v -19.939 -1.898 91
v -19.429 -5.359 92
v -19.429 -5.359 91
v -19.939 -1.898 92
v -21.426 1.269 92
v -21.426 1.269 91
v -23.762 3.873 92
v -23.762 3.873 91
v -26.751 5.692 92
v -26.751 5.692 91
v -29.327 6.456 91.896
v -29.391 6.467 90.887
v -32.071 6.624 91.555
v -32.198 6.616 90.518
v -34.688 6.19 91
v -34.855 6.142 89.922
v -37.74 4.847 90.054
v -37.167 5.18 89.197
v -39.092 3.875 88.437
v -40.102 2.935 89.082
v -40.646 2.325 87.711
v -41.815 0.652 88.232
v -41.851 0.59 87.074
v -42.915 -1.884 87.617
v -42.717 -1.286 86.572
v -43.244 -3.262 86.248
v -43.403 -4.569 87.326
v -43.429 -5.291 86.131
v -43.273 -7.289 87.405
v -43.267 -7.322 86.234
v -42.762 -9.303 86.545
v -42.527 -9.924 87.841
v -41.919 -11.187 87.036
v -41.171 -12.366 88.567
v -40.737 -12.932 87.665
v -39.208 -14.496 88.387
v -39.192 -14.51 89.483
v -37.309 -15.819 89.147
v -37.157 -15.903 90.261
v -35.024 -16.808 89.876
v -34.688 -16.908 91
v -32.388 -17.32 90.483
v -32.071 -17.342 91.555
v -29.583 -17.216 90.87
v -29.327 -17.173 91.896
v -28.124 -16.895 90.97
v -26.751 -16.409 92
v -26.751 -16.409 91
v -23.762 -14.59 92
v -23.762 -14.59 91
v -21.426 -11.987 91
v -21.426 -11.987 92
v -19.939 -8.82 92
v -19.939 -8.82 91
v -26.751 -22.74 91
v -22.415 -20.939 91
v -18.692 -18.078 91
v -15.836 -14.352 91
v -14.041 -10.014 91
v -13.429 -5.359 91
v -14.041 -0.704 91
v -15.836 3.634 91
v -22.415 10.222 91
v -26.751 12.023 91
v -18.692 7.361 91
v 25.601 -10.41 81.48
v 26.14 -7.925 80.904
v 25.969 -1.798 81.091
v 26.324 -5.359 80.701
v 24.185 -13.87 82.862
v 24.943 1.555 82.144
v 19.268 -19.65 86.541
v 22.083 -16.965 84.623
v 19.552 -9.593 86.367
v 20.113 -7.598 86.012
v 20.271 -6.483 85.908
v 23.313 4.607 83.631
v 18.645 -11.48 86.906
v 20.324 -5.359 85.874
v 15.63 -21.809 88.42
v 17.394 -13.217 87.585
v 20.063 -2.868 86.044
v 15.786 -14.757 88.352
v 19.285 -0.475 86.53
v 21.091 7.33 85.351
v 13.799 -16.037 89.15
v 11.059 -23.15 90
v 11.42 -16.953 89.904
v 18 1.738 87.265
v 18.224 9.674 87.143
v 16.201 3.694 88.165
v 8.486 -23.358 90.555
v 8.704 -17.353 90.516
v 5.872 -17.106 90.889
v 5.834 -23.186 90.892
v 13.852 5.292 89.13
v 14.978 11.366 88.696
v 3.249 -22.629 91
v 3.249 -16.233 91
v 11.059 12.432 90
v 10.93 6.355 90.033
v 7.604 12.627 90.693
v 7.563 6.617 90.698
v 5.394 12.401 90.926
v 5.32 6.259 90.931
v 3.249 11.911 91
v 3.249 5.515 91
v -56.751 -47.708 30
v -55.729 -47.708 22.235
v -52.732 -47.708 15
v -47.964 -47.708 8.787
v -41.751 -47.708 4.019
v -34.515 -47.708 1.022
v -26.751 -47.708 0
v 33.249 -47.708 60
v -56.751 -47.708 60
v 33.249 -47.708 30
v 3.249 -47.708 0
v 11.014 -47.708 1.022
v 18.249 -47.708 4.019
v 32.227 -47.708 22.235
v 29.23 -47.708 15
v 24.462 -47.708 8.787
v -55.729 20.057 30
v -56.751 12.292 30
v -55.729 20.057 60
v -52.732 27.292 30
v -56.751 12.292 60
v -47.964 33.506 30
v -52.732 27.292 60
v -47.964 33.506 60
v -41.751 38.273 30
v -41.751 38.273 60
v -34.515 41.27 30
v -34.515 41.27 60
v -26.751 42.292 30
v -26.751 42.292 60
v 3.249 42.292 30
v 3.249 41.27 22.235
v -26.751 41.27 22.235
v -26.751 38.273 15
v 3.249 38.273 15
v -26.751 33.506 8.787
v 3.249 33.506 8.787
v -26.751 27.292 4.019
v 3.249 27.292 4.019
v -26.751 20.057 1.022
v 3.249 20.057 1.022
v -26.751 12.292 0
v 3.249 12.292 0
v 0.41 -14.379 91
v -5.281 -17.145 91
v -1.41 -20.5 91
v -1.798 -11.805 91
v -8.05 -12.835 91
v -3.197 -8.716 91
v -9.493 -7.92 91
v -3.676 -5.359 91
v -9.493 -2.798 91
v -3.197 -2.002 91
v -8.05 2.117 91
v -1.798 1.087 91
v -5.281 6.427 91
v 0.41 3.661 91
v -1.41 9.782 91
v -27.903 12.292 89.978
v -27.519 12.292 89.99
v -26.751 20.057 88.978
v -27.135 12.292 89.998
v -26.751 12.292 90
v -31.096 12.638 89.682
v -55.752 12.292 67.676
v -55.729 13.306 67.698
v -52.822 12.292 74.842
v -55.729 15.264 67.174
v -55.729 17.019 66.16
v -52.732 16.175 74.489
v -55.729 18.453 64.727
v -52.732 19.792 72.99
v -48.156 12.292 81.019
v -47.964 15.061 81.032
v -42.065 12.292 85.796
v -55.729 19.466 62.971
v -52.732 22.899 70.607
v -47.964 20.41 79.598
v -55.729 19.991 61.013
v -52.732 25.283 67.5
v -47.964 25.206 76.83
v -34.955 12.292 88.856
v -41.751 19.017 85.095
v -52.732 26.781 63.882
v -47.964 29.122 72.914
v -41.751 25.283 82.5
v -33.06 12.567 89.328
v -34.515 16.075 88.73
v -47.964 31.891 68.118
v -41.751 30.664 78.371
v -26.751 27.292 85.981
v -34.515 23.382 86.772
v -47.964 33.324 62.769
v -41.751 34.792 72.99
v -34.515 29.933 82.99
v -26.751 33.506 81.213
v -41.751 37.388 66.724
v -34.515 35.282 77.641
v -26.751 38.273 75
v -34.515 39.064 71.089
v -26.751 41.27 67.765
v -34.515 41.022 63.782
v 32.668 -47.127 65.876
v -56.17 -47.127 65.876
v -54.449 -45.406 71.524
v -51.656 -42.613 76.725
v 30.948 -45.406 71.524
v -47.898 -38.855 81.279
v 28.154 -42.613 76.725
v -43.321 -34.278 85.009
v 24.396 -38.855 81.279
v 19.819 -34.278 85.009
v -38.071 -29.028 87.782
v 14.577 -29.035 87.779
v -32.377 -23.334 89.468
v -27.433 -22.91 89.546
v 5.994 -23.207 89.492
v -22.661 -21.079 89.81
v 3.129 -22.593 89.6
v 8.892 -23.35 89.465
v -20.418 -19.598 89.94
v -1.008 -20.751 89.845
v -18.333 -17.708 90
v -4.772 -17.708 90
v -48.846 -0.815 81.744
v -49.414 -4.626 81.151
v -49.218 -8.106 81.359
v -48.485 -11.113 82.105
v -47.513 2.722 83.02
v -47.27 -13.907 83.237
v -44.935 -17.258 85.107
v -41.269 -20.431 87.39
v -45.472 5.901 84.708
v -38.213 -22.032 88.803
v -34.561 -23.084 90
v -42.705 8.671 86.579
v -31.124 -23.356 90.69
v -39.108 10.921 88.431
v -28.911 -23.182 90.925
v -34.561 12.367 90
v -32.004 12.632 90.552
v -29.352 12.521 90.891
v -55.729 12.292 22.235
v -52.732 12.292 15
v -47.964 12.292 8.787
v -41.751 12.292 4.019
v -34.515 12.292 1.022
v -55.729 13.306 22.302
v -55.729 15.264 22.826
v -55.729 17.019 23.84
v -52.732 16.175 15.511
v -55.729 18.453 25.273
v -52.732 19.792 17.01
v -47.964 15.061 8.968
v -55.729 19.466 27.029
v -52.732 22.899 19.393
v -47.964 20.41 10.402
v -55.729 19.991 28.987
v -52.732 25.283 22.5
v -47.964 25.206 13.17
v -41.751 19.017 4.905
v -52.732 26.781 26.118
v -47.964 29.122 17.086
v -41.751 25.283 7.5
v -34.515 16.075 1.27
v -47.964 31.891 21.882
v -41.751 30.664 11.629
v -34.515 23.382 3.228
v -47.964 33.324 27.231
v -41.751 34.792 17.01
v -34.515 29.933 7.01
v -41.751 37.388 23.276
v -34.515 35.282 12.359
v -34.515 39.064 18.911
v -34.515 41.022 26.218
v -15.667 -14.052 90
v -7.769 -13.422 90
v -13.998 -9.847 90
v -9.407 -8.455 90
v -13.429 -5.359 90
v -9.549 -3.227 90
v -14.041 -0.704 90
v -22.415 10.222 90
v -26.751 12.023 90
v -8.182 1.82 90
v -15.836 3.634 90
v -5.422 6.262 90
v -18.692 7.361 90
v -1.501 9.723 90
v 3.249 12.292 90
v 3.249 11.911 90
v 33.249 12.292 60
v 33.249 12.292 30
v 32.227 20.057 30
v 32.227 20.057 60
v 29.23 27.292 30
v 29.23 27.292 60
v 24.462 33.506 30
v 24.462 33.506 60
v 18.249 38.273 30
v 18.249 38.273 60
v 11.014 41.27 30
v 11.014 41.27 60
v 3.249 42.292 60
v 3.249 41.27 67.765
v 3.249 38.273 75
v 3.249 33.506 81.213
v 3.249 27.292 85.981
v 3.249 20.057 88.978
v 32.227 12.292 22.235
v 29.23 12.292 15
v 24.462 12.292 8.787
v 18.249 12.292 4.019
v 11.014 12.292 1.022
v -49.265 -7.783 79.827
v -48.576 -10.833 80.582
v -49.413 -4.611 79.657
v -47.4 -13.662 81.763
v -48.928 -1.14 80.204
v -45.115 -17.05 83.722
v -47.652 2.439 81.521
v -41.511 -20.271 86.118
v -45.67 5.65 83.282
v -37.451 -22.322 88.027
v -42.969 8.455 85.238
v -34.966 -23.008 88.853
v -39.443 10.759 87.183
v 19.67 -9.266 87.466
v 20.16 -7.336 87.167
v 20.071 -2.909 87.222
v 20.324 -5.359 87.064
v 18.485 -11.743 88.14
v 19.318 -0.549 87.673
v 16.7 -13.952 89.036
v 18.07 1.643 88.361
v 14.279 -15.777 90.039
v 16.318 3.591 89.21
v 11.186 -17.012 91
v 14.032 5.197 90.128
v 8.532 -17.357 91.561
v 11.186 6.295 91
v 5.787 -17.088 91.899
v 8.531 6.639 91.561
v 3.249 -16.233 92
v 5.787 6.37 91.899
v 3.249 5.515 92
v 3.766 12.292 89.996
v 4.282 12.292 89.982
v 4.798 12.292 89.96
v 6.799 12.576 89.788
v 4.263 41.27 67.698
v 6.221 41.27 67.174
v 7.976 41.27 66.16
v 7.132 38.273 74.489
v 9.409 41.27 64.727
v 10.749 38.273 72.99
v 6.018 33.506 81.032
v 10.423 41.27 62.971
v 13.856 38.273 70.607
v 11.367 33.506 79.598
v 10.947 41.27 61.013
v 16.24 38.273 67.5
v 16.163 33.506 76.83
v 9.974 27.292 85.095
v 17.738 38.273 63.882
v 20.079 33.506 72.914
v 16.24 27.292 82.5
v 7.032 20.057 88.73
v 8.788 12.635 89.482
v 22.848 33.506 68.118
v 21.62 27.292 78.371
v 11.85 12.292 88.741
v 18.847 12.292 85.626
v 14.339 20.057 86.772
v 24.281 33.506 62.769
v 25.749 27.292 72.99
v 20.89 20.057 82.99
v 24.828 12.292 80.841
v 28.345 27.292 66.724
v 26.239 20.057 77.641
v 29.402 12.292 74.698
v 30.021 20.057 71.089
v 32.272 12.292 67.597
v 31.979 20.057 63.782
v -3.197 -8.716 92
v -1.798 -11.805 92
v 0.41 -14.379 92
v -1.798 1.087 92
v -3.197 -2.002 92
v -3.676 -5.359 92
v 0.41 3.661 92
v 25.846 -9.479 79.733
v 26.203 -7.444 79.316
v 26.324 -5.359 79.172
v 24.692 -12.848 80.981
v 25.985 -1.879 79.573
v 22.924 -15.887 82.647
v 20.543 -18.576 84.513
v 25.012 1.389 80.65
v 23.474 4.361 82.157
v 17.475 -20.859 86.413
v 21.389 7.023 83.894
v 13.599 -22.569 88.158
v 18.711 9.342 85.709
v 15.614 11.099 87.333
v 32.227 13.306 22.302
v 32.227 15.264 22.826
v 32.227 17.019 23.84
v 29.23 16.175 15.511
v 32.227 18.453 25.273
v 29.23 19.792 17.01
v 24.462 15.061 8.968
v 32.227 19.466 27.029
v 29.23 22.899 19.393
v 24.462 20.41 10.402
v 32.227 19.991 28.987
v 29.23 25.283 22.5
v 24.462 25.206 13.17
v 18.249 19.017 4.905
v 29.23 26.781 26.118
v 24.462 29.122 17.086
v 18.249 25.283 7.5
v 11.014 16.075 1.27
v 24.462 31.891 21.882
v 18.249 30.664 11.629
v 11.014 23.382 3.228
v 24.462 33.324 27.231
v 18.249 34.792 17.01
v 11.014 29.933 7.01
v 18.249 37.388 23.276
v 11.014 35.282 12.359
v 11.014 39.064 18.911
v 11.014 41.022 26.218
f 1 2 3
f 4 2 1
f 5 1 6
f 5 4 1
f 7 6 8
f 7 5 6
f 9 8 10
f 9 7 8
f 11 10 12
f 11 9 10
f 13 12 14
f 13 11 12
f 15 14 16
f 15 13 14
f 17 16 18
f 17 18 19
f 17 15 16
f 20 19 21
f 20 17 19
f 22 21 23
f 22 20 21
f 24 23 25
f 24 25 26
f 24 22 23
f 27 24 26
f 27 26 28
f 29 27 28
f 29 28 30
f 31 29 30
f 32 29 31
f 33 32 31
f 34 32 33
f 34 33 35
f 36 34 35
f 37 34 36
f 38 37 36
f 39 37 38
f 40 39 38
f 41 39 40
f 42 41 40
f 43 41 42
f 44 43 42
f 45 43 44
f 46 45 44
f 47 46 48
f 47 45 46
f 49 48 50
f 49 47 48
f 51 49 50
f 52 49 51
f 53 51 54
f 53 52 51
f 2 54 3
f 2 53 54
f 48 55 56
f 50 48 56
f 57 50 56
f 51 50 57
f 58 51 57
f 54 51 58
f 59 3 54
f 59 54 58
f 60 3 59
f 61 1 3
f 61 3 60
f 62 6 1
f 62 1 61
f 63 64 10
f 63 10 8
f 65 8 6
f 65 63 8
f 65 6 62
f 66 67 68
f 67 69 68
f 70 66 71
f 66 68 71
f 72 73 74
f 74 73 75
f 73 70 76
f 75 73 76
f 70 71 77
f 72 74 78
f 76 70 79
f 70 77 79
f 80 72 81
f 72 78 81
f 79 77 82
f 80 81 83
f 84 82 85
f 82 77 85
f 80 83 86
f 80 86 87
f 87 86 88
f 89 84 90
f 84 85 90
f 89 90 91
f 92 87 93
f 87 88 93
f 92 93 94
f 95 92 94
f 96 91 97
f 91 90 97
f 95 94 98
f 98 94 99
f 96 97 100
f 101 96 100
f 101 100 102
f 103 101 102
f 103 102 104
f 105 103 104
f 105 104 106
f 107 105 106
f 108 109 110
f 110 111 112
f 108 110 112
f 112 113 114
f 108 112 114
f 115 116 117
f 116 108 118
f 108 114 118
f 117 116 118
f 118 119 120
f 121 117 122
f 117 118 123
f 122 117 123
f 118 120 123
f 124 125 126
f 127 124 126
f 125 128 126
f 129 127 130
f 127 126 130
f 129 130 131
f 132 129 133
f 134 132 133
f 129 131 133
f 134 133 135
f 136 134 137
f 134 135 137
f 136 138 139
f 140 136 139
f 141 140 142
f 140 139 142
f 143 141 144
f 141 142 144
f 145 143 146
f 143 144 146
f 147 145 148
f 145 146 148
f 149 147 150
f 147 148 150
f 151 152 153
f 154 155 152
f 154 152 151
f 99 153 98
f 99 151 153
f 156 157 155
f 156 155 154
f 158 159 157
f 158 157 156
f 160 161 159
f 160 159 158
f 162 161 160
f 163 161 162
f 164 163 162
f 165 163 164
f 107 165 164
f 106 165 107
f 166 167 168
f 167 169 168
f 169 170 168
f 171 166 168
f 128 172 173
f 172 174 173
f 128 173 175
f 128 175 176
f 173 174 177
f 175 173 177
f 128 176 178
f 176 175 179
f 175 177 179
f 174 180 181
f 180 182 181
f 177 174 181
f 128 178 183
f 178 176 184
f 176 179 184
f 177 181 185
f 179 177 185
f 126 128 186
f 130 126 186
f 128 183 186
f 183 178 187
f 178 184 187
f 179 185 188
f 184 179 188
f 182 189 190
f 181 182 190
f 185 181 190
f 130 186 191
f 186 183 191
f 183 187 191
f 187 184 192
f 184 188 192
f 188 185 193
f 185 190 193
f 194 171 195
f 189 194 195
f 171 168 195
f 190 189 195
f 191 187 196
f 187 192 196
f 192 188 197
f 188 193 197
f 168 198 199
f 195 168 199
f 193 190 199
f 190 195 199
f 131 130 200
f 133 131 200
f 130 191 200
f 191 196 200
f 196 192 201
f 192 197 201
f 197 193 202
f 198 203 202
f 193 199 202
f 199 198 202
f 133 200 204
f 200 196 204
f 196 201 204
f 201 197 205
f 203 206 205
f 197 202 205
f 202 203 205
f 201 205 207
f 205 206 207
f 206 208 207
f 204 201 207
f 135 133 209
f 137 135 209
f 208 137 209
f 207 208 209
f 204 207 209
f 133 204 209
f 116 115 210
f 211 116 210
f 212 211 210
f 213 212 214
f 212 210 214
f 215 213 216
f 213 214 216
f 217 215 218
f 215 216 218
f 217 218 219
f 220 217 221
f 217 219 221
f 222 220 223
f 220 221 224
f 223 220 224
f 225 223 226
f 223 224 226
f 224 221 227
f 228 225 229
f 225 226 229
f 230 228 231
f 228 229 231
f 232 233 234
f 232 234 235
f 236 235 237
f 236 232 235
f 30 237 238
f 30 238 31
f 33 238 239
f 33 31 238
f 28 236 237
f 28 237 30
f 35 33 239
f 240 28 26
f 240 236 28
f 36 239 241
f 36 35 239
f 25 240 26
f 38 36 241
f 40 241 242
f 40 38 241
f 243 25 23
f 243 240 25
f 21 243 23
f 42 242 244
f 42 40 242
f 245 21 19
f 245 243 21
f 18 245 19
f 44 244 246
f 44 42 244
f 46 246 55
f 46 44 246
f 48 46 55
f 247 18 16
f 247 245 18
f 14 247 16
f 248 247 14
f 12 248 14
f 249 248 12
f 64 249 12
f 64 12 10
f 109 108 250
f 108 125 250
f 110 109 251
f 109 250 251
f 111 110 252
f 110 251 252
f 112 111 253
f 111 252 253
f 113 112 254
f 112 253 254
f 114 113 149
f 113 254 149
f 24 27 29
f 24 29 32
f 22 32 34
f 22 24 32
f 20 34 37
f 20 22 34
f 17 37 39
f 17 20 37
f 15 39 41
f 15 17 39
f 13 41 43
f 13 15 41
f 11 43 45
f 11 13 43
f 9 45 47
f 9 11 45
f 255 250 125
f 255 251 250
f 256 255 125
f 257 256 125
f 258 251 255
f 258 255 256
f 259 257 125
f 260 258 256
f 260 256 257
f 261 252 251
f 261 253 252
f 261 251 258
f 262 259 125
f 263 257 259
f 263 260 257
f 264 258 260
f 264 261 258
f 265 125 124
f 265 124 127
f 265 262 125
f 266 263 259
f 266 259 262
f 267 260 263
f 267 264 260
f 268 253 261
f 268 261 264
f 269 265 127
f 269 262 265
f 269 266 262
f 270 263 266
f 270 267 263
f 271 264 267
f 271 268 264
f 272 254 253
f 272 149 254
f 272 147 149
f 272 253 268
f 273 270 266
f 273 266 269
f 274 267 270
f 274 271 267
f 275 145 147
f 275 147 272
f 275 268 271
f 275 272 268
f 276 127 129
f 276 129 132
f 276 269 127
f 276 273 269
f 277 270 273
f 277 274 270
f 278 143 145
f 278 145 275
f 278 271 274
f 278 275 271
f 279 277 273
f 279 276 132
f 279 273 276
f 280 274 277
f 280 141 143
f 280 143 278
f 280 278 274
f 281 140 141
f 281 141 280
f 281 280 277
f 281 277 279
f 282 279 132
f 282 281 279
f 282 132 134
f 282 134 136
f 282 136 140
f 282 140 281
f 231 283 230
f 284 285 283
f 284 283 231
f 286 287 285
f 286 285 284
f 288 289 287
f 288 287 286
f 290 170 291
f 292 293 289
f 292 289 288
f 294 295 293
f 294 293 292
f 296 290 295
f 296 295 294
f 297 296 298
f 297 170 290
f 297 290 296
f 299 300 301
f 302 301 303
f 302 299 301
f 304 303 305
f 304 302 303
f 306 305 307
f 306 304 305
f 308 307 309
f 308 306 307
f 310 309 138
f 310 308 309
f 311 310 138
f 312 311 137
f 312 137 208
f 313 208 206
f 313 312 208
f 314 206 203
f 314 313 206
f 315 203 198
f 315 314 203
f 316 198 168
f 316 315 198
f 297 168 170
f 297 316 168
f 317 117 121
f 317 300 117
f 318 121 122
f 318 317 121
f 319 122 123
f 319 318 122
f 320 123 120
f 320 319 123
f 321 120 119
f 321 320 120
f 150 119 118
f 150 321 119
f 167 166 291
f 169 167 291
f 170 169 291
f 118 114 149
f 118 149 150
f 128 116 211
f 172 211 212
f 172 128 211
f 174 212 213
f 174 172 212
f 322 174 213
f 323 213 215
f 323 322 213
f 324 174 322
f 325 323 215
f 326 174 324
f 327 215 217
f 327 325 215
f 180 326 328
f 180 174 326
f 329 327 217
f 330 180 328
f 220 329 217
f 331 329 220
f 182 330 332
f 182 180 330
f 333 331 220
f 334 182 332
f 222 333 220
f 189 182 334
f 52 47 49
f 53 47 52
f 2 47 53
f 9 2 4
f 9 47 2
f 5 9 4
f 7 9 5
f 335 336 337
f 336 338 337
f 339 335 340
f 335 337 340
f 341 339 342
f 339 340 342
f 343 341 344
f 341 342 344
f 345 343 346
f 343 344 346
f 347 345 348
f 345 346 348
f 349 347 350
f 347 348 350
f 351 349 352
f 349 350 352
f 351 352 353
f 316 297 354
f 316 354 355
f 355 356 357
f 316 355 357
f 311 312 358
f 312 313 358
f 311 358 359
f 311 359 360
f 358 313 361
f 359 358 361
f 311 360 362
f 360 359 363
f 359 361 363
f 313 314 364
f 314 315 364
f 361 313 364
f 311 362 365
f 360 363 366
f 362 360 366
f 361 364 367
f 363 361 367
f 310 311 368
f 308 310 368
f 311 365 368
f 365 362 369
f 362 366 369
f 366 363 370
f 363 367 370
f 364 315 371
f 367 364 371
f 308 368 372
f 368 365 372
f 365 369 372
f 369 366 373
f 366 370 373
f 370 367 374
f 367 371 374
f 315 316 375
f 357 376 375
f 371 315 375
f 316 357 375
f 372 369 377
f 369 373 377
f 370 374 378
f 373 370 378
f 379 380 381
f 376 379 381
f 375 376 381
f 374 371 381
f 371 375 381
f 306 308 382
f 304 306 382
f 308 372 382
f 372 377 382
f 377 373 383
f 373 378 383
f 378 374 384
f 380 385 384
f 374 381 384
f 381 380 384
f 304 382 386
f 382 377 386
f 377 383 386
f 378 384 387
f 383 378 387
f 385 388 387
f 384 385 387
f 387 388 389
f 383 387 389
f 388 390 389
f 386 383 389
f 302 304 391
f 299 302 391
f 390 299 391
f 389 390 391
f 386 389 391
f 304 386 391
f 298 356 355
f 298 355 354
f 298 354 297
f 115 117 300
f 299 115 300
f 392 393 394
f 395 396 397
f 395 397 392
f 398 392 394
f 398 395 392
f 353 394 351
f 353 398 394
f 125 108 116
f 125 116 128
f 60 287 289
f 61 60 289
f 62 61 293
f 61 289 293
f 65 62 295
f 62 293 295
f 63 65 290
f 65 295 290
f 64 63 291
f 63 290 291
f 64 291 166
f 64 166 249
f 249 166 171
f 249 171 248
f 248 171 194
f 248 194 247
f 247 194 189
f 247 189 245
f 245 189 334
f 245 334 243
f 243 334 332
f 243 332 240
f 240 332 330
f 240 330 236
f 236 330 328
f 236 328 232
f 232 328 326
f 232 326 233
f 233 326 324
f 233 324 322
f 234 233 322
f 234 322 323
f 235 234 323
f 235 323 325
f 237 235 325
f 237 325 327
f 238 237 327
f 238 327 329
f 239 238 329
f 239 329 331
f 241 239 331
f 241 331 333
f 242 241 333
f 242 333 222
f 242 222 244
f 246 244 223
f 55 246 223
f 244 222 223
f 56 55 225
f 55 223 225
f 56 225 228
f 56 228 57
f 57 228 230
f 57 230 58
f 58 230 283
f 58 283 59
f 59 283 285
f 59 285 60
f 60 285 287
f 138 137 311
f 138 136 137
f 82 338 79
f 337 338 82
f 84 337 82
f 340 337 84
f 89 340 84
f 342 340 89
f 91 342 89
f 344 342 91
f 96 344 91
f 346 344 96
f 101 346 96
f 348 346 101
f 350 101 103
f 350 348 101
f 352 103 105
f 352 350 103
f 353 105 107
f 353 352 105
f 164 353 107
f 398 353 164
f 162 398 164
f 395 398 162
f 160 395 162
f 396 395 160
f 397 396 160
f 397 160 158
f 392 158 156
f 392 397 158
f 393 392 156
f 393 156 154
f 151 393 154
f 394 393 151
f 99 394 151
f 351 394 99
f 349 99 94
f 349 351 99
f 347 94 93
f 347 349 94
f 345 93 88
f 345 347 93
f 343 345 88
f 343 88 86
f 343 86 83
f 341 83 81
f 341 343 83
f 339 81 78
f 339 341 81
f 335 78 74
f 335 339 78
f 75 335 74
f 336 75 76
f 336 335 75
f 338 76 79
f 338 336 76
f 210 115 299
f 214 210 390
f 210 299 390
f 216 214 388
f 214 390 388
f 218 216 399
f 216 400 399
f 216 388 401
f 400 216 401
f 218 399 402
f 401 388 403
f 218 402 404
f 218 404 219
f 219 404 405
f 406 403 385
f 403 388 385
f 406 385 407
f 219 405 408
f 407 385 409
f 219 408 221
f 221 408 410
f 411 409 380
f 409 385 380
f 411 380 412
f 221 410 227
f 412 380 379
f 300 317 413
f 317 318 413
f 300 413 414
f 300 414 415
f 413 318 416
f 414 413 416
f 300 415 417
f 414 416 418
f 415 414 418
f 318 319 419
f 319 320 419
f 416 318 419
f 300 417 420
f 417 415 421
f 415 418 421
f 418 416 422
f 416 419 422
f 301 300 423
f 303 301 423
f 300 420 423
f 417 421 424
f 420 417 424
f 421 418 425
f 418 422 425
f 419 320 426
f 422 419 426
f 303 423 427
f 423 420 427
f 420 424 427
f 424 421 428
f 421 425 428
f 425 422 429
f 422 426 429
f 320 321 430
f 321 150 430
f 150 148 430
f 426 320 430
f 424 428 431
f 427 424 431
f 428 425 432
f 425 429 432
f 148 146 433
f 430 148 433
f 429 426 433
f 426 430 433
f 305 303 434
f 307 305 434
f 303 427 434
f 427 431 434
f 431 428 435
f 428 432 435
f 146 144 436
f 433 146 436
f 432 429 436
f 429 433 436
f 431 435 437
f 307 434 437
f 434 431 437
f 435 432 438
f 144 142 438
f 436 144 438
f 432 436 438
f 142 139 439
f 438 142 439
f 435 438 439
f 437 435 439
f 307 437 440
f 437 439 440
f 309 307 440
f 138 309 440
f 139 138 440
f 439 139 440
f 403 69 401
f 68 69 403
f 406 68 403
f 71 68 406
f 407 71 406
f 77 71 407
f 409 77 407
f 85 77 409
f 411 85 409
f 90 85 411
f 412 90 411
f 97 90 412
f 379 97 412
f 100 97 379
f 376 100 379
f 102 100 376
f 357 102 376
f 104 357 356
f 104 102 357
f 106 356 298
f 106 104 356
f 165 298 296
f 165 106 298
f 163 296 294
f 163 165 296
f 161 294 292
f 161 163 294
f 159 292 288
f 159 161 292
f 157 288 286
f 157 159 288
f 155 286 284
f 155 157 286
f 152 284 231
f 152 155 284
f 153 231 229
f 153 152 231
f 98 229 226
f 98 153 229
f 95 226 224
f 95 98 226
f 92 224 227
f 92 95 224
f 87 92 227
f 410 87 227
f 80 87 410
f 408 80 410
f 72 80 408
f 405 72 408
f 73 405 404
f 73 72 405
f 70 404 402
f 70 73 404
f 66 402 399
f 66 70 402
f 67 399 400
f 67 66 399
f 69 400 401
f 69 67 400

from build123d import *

# Parameters (mm, degrees)
CROQUIS1_W                   = 90
CROQUIS1_H                   = 90
SALIENTE_EXTRUIR1_DEPTH      = 90
REDONDEO2_R                  = 30
CROQUIS2_R                   = 18
SALIENTE_EXTRUIR2_DEPTH      = 1
SALIENTE_EXTRUIR2_DEPTH_BACK = 12
CORTAR_EXTRUIR1_DEPTH        = 74
CROQUIS4_R                   = 12
SALIENTE_EXTRUIR3_DEPTH      = 1
SALIENTE_EXTRUIR3_DEPTH_BACK = 6
CORTAR_EXTRUIR2_DEPTH        = 100


with BuildPart() as part:
    # Croquis1 → Saliente-Extruir1 (new body)
    with BuildSketch(Plane.XY):
        with Locations((-11.750768053, -2.707538995)):
            Rectangle(CROQUIS1_W, CROQUIS1_H)
    extrude(amount=SALIENTE_EXTRUIR1_DEPTH)

    # Redondeo2
    redondeo2_edges = [part.edges().sort_by_distance(p)[0] for p in [
        (33.249231947, -2.707538995, 90),
        (-11.750768053, 42.292461005, 90),
        (-56.750768053, -2.707538995, 90),
        (-11.750768053, 42.292461005, 0),
        (33.249231947, -2.707538995, 0),
        (-56.750768053, -2.707538995, 0),
        (-11.750768053, -47.707538995, 90),
        (-56.750768053, 42.292461005, 45),
        (33.249231947, 42.292461005, 45),
    ]]
    fillet(redondeo2_edges, radius=REDONDEO2_R)

    # Croquis2 → Saliente-Extruir2 (add, two sides)
    with BuildSketch(Plane.XY.offset(90)) as saliente_extruir2_sk:
        with Locations((8.324186068, -5.35884863)):
            Circle(CROQUIS2_R)
        with Locations((-31.428963697, -5.35884863)):
            Circle(CROQUIS2_R)
    extrude(amount=SALIENTE_EXTRUIR2_DEPTH)
    extrude(saliente_extruir2_sk.sketch, amount=-SALIENTE_EXTRUIR2_DEPTH_BACK)

    # Croquis3 → Cortar-Extruir1 (cut)
    with BuildSketch(Plane(origin=(0, 42.292461005, 0), x_dir=(1, 0, 0), z_dir=(0, 1, 0))):
        with BuildLine():
            ThreePointArc((-50.140421134, -80.34512543), (-39.601859674, -88.210803678), (-26.750768053, -91))
            Line((-26.750768053, -91), (-50.140421134, -91))
            Line((-50.140421134, -91), (-50.140421134, -80.34512543))
        make_face()
        with BuildLine():
            Line((26.638885028, -91), (26.638885028, -80.34512543))
            ThreePointArc((26.638885028, -80.34512543), (16.100323567, -88.210803678), (3.249231947, -91))
            Line((3.249231947, -91), (26.638885028, -91))
        make_face()
    extrude(amount=-CORTAR_EXTRUIR1_DEPTH, mode=Mode.SUBTRACT)

    # Croquis4 → Saliente-Extruir3 (add, two sides)
    with BuildSketch(Plane.XY.offset(91)) as saliente_extruir3_sk:
        with Locations((-31.428963697, -5.35884863)):
            Circle(CROQUIS4_R)
        with Locations((8.324186068, -5.35884863)):
            Circle(CROQUIS4_R)
    extrude(amount=SALIENTE_EXTRUIR3_DEPTH)
    extrude(saliente_extruir3_sk.sketch, amount=-SALIENTE_EXTRUIR3_DEPTH_BACK)

    # Croquis5 → Cortar-Extruir2 (cut)
    with BuildSketch(Plane(origin=(0, 42.292461005, 0), x_dir=(1, 0, 0), z_dir=(0, 1, 0))):
        with BuildLine():
            ThreePointArc((-48.087335127, -83.84849902), (-38.171101485, -89.892741332), (-26.750768053, -92))
            Line((-26.750768053, -92), (-43.428963697, -92))
            Line((-43.428963697, -92), (-48.087335127, -92))
            Line((-48.087335127, -92), (-48.087335127, -83.84849902))
        make_face()
        with BuildLine():
            ThreePointArc((24.585799021, -83.84849902), (14.669565378, -89.892741332), (3.249231947, -92))
            Line((3.249231947, -92), (19.927427591, -92))
            Line((19.927427591, -92), (24.585799021, -92))
            Line((24.585799021, -92), (24.585799021, -83.84849902))
        make_face()
    extrude(amount=-CORTAR_EXTRUIR2_DEPTH, mode=Mode.SUBTRACT)


solid = part.part
